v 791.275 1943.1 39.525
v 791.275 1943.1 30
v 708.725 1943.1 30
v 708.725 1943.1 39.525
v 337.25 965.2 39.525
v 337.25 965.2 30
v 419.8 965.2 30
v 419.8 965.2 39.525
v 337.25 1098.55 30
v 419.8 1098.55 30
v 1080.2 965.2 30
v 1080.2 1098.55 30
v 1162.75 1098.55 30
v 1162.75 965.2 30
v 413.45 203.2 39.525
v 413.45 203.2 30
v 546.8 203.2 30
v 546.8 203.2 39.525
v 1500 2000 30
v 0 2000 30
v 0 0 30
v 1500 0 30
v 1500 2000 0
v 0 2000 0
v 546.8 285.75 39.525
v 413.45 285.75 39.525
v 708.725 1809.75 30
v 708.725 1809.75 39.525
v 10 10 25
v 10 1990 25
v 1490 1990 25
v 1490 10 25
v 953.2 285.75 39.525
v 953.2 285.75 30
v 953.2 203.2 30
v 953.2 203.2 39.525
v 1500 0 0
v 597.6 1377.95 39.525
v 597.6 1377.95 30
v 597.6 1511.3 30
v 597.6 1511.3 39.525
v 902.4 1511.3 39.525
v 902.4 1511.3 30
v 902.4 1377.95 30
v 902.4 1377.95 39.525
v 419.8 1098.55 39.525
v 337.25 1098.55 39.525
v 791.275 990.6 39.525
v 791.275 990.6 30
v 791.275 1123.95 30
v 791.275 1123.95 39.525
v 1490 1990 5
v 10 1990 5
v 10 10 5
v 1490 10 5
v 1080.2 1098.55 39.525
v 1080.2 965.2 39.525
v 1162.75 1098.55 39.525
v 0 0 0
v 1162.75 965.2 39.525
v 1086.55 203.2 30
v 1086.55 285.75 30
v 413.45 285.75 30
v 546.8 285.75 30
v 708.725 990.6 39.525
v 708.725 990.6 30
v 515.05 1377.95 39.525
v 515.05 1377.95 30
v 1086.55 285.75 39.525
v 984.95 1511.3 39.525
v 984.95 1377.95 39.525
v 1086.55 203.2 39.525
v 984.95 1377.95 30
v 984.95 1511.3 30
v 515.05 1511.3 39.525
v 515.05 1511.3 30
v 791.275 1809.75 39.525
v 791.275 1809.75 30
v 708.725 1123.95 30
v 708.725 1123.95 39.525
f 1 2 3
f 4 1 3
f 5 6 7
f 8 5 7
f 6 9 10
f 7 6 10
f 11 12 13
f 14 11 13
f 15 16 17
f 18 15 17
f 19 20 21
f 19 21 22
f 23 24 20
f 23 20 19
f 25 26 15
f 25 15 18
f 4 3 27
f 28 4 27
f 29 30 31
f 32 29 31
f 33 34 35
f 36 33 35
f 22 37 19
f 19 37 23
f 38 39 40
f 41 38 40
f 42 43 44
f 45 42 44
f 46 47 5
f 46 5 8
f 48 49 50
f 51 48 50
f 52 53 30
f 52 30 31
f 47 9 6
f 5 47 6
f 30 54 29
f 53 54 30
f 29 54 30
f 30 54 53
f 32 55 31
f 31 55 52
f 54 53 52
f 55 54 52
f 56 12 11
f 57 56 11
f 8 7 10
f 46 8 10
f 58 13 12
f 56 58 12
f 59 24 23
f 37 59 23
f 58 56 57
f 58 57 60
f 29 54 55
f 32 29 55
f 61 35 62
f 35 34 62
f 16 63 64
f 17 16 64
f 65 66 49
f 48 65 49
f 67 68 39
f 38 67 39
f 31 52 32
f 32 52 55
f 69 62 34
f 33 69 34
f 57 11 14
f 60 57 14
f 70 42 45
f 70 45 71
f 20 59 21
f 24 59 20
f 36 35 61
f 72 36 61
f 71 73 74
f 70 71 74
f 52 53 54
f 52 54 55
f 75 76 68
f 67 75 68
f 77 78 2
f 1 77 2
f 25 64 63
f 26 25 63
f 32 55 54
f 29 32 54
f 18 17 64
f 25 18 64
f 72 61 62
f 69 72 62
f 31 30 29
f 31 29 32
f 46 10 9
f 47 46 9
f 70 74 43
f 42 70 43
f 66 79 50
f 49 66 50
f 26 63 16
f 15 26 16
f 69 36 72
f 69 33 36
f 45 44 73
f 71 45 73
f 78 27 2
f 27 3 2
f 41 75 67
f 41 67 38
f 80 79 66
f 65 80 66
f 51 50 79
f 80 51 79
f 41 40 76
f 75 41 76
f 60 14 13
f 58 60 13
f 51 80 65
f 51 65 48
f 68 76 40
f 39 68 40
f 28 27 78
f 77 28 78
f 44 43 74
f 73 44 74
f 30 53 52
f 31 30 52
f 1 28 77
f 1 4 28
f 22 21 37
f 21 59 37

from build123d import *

# Parameters (mm, degrees)
F0_W     = 1500
F0_H     = 2000
F1_DEPTH = 5
F2_W     = 1480
F2_H     = 1980
F3_DEPTH = 20
F4_DEPTH = 20
F5_W     = 1500
F5_H     = 2000
F6_DEPTH = 5
F7_W     = 76.2
F7_H     = 130.175
F8_DEPTH = 9.525
F7_W_2   = 130.175
F7_H_2   = 76.2
F7_W_3   = 38.1


# Not quite as in the source:
# - a feature of the source that left no trace in its solid (it failed there, or was rolled back) is left out


with BuildPart() as f1:
    # F0 (on Top) → F1 (new body)
    with BuildSketch(Plane.XY):
        with Locations((750, 1000)):
            Rectangle(F0_W, F0_H)
    extrude(amount=F1_DEPTH)

    # F2 (on face) → F4 (join)
    with BuildSketch(Plane.XY.offset(5)):
        Polygon((0, 2000), (0, 0), (10, 0), (10, 10), (10, 1990), (1490, 1990), (1500, 1990), (1500, 2000), align=None)
        Polygon((10, 10), (10, 0), (1500, 0), (1500, 1990), (1490, 1990), (1490, 10), align=None)
    extrude(amount=F4_DEPTH)

    # F5 (on face) → F6 (join)
    with BuildSketch(Plane.XY.offset(25)):
        with Locations((750, 1000)):
            Rectangle(F5_W, F5_H)
    extrude(amount=F6_DEPTH)


with BuildPart() as f3:
    # F2 (on face) → F3 (new body)
    with BuildSketch(Plane.XY.offset(5)):
        with Locations((750, 1000)):
            Rectangle(F2_W, F2_H)
    extrude(amount=F3_DEPTH)


with BuildPart() as f8:
    # F7 (on face) → F8 (new body)
    with BuildSketch(Plane.XY.offset(30)):
        Polygon((594.425, 1377.95), (597.6, 1377.95), (597.6, 1511.3), (515.05, 1511.3), (515.05, 1377.95), (518.225, 1377.95), (518.225, 1508.125), (594.425, 1508.125), align=None)
        with Locations((556.325, 1443.0375)):
            Rectangle(F7_W, F7_H)
    extrude(amount=F8_DEPTH)


with BuildPart() as f8b:
    # F7 (on face) → F8, piece 2 (new body)
    with BuildSketch(Plane.XY.offset(30)):
        with Locations((943.675, 1443.0375)):
            Rectangle(F7_W, F7_H)
        Polygon((902.4, 1511.3), (902.4, 1377.95), (905.575, 1377.95), (905.575, 1508.125), (981.775, 1508.125), (981.775, 1377.95), (984.95, 1377.95), (984.95, 1511.3), align=None)
    extrude(amount=F8_DEPTH)


with BuildPart() as f8c:
    # F7 (on face) → F8, piece 3 (new body)
    with BuildSketch(Plane.XY.offset(30)):
        Polygon((708.725, 1809.75), (711.9, 1809.75), (711.9, 1939.925), (788.1, 1939.925), (788.1, 1809.75), (791.275, 1809.75), (791.275, 1943.1), (708.725, 1943.1), align=None)
        Polygon((711.9, 1809.75), (750, 1809.75), (788.1, 1809.75), (788.1, 1939.925), (711.9, 1939.925), align=None)
    extrude(amount=F8_DEPTH)


with BuildPart() as f8d:
    # F7 (on face) → F8, piece 4 (new body)
    with BuildSketch(Plane.XY.offset(30)):
        Polygon((419.8, 965.2), (419.8, 990.6), (419.8, 1098.55), (416.625, 1098.55), (416.625, 968.375), (340.425, 968.375), (340.425, 1098.55), (337.25, 1098.55), (337.25, 965.2), align=None)
        with Locations((378.525, 1033.4625)):
            Rectangle(F7_W, F7_H)
    extrude(amount=F8_DEPTH)


with BuildPart() as f8e:
    # F7 (on face) → F8, piece 5 (new body)
    with BuildSketch(Plane.XY.offset(30)):
        with Locations((481.7125, 244.475)):
            Rectangle(F7_W_2, F7_H_2)
        Polygon((413.45, 203.2), (546.8, 203.2), (546.8, 206.375), (416.625, 206.375), (416.625, 282.575), (546.8, 282.575), (546.8, 285.75), (413.45, 285.75), align=None)
    extrude(amount=F8_DEPTH)


with BuildPart() as f8f:
    # F7 (on face) → F8, piece 6 (new body)
    with BuildSketch(Plane.XY.offset(30)):
        with Locations((1018.2875, 244.475)):
            Rectangle(F7_W_2, F7_H_2)
        Polygon((953.2, 206.375), (953.2, 203.2), (1086.55, 203.2), (1086.55, 285.75), (953.2, 285.75), (953.2, 282.575), (1083.375, 282.575), (1083.375, 206.375), align=None)
    extrude(amount=F8_DEPTH)


with BuildPart() as f8g:
    # F7 (on face) → F8, piece 7 (new body)
    with BuildSketch(Plane.XY.offset(30)):
        Polygon((1080.2, 1098.55), (1080.2, 990.6), (1080.2, 965.2), (1162.75, 965.2), (1162.75, 1098.55), (1159.575, 1098.55), (1159.575, 968.375), (1083.375, 968.375), (1083.375, 1098.55), align=None)
        with Locations((1121.475, 1033.4625)):
            Rectangle(F7_W, F7_H)
    extrude(amount=F8_DEPTH)


with BuildPart() as f8h:
    # F7 (on face) → F8, piece 8 (new body)
    with BuildSketch(Plane.XY.offset(30)):
        with Locations((730.95, 1058.8625)):
            Rectangle(F7_W_3, F7_H)
        Polygon((708.725, 990.6), (750, 990.6), (750, 993.775), (711.9, 993.775), (711.9, 1123.95), (708.725, 1123.95), align=None)
        Polygon((750, 993.775), (750, 990.6), (791.275, 990.6), (791.275, 1123.95), (788.1, 1123.95), (788.1, 993.775), align=None)
        with Locations((769.05, 1058.8625)):
            Rectangle(F7_W_3, F7_H)
    extrude(amount=F8_DEPTH)


solid = Compound([f1.part, f3.part, f8.part, f8b.part, f8c.part, f8d.part, f8e.part, f8f.part, f8g.part, f8h.part])
